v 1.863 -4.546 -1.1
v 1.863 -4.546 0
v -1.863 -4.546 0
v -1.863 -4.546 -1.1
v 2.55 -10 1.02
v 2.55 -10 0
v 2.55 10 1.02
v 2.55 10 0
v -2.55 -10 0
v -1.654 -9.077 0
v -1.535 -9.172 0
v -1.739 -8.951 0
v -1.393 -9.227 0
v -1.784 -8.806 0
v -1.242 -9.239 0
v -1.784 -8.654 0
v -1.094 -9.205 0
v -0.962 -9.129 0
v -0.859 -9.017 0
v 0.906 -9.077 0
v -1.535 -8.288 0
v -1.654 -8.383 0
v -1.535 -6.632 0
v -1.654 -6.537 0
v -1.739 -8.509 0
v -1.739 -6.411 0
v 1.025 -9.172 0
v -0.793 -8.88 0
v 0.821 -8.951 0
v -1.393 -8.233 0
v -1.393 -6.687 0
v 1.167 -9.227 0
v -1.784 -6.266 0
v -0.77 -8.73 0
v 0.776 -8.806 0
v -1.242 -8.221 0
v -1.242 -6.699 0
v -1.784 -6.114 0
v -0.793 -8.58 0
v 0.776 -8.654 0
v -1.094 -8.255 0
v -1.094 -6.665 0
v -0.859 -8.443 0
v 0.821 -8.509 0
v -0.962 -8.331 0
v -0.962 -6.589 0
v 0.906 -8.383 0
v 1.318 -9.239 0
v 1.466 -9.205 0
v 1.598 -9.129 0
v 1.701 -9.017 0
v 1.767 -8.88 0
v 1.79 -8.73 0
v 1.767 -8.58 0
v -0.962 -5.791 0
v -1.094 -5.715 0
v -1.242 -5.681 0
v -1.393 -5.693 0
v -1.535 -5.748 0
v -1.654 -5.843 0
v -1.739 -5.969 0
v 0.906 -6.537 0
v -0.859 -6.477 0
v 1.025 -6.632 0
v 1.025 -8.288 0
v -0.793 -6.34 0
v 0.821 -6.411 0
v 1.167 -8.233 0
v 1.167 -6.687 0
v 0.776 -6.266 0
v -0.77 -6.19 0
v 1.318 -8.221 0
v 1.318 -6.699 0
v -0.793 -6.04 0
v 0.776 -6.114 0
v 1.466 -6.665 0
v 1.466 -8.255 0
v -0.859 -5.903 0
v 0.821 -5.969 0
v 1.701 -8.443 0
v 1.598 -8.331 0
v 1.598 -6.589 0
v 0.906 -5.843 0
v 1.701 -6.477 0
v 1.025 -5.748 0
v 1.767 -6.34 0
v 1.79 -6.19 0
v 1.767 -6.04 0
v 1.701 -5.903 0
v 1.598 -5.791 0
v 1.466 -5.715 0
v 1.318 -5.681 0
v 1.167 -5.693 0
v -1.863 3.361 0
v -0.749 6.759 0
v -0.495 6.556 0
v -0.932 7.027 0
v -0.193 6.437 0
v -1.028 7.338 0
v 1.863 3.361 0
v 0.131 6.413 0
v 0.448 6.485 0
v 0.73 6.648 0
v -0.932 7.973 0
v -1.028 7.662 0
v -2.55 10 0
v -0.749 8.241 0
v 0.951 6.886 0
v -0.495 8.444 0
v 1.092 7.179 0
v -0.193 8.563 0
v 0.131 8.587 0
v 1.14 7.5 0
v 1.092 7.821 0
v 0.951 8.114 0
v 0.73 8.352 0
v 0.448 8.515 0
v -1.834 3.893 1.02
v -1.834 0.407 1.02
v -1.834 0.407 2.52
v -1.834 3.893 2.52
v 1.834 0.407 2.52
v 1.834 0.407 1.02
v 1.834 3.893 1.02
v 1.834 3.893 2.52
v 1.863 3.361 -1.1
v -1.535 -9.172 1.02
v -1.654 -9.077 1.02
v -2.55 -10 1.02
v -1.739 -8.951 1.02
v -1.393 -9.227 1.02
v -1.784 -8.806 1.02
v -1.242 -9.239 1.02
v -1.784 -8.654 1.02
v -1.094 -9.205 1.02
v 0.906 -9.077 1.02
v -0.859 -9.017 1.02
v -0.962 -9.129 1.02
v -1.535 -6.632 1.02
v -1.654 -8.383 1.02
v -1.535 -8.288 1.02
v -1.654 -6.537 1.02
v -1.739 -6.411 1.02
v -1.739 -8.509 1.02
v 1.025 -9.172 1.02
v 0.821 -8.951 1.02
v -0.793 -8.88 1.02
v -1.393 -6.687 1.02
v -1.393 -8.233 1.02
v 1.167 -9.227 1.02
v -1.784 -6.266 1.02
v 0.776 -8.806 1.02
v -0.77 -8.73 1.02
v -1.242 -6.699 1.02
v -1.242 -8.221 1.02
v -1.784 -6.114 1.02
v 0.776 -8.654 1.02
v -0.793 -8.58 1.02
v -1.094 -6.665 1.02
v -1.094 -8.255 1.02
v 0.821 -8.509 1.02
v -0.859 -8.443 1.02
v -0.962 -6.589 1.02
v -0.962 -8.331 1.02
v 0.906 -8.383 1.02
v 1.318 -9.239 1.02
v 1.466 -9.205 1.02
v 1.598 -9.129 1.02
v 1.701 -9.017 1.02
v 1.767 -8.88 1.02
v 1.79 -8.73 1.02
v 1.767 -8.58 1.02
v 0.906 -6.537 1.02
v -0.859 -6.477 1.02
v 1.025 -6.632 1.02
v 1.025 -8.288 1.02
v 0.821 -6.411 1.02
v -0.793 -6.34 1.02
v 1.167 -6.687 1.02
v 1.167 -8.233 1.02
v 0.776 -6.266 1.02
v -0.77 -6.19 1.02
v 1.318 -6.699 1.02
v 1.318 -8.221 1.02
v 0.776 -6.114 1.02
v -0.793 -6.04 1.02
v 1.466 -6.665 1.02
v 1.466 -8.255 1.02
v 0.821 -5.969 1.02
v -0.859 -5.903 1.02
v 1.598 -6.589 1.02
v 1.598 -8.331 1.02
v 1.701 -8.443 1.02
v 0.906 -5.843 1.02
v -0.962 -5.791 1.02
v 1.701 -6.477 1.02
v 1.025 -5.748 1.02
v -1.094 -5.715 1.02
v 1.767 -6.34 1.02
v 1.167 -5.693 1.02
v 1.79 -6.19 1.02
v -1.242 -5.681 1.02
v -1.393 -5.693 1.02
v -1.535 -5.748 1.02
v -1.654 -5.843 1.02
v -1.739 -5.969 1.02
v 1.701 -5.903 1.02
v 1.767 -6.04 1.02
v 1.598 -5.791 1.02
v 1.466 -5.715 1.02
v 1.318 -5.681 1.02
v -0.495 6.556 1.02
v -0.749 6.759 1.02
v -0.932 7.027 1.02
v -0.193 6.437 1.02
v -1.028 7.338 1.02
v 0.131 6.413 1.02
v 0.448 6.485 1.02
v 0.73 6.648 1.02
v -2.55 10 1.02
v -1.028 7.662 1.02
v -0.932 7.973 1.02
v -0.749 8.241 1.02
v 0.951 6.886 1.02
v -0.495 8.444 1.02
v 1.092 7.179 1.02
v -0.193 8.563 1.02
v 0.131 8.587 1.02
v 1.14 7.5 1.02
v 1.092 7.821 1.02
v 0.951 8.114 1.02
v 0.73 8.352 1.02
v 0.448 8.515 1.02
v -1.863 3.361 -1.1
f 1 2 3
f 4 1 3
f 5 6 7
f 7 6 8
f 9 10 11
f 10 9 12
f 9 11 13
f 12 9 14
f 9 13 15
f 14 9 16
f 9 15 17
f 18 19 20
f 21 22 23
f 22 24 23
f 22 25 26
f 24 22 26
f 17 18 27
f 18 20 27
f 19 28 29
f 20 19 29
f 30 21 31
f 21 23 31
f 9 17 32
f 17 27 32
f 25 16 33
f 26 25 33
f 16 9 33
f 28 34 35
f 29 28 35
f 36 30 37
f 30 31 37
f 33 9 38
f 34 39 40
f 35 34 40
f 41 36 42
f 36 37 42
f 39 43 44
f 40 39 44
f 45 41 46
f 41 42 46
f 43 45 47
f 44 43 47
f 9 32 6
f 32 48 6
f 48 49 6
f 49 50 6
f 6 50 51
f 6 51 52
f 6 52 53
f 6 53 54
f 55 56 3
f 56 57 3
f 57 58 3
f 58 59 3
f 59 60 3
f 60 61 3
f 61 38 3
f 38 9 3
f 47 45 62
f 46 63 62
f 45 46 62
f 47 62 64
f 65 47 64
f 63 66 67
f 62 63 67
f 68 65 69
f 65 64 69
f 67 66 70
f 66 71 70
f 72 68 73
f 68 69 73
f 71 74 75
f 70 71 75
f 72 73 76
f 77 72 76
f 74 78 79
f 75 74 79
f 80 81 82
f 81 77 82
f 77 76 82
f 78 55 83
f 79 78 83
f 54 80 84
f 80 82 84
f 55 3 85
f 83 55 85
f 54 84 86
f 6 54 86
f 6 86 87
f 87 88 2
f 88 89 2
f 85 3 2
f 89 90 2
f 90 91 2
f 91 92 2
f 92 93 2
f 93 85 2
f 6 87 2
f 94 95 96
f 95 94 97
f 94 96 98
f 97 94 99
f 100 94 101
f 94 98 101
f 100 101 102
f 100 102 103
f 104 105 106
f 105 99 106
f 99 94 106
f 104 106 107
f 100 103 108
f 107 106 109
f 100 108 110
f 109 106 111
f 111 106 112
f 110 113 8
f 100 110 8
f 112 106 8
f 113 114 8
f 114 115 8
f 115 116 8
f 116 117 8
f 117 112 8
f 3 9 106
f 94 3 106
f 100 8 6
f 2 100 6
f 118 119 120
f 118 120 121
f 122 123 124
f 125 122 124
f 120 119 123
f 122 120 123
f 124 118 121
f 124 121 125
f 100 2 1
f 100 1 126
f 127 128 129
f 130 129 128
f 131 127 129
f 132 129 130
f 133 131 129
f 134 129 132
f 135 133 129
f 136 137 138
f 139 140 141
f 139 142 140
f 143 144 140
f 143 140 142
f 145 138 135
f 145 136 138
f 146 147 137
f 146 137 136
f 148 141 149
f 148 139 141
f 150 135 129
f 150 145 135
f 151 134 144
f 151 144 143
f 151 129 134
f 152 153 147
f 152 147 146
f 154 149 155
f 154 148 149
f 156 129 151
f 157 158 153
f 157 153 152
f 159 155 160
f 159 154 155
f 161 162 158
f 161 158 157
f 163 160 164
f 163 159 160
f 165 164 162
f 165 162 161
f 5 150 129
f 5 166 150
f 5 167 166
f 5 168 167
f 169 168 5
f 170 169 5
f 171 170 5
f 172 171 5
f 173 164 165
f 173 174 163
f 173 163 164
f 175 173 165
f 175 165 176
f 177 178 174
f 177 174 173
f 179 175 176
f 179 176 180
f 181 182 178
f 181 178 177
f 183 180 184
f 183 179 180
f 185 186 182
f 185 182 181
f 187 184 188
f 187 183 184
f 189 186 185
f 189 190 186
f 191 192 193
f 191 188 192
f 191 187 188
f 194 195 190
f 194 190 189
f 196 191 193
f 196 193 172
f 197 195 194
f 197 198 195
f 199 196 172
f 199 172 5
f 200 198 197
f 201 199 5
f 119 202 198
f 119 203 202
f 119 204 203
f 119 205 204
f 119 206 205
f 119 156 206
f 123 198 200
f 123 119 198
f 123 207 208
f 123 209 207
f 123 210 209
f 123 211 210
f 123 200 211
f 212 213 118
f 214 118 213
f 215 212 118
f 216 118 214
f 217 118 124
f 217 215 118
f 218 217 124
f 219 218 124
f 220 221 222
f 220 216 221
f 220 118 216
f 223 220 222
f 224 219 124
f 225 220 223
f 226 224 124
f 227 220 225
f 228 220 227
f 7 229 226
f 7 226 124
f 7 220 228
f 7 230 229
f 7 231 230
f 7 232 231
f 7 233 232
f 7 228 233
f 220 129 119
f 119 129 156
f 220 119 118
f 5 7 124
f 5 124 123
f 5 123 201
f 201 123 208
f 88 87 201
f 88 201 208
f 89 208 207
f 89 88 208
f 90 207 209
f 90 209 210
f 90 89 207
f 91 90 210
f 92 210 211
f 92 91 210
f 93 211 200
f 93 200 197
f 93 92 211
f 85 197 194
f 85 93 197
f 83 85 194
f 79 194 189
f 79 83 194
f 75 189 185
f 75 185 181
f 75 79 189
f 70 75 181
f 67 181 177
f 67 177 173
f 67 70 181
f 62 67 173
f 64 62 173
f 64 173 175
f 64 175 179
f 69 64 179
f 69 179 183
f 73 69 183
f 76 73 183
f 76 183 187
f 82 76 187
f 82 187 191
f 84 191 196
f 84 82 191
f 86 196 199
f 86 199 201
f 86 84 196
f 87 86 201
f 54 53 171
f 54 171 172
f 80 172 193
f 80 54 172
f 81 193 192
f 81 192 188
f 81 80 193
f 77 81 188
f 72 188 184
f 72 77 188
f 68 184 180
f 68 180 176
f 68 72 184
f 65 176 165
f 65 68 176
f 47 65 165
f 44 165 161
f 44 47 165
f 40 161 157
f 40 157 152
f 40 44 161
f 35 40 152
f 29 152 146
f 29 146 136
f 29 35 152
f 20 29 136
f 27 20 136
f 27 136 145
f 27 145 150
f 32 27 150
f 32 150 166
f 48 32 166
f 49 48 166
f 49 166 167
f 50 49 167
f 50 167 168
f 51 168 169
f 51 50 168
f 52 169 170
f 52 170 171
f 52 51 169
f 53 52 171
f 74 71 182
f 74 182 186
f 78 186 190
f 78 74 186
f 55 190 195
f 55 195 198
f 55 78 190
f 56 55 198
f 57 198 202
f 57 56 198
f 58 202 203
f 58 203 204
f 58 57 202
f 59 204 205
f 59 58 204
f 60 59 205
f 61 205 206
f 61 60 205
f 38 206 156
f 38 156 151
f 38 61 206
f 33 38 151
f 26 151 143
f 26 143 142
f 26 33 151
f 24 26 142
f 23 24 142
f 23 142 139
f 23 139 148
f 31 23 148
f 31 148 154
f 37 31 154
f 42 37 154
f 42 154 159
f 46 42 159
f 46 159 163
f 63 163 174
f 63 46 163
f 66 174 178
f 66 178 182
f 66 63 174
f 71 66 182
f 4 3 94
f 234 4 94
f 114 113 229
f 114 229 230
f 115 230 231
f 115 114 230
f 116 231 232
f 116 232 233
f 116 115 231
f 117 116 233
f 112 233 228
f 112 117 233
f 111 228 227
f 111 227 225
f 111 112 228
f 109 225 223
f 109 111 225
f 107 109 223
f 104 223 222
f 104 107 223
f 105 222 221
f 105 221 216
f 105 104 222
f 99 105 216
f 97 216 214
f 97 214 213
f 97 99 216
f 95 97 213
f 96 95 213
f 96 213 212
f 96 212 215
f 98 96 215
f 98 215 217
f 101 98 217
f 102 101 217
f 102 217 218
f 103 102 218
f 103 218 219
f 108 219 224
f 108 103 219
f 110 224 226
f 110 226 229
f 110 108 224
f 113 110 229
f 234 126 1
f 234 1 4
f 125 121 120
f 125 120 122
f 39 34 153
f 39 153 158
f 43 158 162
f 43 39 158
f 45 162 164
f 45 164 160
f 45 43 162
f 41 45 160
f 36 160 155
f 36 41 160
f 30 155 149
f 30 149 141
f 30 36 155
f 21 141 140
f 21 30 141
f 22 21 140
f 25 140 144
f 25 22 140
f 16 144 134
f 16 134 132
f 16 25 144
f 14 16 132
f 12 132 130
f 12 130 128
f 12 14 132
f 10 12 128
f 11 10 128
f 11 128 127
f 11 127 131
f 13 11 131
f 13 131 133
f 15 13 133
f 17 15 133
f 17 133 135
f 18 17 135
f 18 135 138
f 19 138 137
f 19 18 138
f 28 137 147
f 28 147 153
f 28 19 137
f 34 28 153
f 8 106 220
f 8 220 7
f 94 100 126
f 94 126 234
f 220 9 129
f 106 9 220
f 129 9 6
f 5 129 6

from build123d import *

# Parameters (mm, degrees)
SKETCH1_W           = 5.1
SKETCH1_H           = 20
SKETCH1_R           = 1.09
SKETCH1_R_2         = 0.51
BOSS_EXTRUDE1_DEPTH = 1.02
SKETCH2_W           = 3.667230494
SKETCH2_H           = 3.486682144
BOSS_EXTRUDE2_DEPTH = 1.5
SKETCH3_W           = 3.726930802
SKETCH3_H           = 7.906409835
BOSS_EXTRUDE3_DEPTH = 1.1


with BuildPart() as part:
    # Sketch1 → Boss-Extrude1 (new body)
    with BuildSketch(Plane.XY):
        Rectangle(SKETCH1_W, SKETCH1_H)
        with Locations((0.05, 7.5)):
            Circle(SKETCH1_R, mode=Mode.SUBTRACT)
        with Locations((-1.28, -6.19)):
            Circle(SKETCH1_R_2, mode=Mode.SUBTRACT)
        with Locations((1.28, -6.19)):
            Circle(SKETCH1_R_2, mode=Mode.SUBTRACT)
        with Locations((1.28, -8.73)):
            Circle(SKETCH1_R_2, mode=Mode.SUBTRACT)
        with Locations((-1.28, -8.73)):
            Circle(SKETCH1_R_2, mode=Mode.SUBTRACT)
    extrude(amount=BOSS_EXTRUDE1_DEPTH)

    # Sketch2 → Boss-Extrude2 (add)
    with BuildSketch(Plane.XY.offset(1.02)):
        with Locations((0, 2.15)):
            Rectangle(SKETCH2_W, SKETCH2_H)
    extrude(amount=BOSS_EXTRUDE2_DEPTH)

    # Sketch3 → Boss-Extrude3 (add)
    with BuildSketch(Plane(origin=(0, 0, 0), x_dir=(-1, 0, 0), z_dir=(0, 0, -1))):
        with Locations((0, -0.592550596)):
            Rectangle(SKETCH3_W, SKETCH3_H)
    extrude(amount=BOSS_EXTRUDE3_DEPTH)


solid = part.part
